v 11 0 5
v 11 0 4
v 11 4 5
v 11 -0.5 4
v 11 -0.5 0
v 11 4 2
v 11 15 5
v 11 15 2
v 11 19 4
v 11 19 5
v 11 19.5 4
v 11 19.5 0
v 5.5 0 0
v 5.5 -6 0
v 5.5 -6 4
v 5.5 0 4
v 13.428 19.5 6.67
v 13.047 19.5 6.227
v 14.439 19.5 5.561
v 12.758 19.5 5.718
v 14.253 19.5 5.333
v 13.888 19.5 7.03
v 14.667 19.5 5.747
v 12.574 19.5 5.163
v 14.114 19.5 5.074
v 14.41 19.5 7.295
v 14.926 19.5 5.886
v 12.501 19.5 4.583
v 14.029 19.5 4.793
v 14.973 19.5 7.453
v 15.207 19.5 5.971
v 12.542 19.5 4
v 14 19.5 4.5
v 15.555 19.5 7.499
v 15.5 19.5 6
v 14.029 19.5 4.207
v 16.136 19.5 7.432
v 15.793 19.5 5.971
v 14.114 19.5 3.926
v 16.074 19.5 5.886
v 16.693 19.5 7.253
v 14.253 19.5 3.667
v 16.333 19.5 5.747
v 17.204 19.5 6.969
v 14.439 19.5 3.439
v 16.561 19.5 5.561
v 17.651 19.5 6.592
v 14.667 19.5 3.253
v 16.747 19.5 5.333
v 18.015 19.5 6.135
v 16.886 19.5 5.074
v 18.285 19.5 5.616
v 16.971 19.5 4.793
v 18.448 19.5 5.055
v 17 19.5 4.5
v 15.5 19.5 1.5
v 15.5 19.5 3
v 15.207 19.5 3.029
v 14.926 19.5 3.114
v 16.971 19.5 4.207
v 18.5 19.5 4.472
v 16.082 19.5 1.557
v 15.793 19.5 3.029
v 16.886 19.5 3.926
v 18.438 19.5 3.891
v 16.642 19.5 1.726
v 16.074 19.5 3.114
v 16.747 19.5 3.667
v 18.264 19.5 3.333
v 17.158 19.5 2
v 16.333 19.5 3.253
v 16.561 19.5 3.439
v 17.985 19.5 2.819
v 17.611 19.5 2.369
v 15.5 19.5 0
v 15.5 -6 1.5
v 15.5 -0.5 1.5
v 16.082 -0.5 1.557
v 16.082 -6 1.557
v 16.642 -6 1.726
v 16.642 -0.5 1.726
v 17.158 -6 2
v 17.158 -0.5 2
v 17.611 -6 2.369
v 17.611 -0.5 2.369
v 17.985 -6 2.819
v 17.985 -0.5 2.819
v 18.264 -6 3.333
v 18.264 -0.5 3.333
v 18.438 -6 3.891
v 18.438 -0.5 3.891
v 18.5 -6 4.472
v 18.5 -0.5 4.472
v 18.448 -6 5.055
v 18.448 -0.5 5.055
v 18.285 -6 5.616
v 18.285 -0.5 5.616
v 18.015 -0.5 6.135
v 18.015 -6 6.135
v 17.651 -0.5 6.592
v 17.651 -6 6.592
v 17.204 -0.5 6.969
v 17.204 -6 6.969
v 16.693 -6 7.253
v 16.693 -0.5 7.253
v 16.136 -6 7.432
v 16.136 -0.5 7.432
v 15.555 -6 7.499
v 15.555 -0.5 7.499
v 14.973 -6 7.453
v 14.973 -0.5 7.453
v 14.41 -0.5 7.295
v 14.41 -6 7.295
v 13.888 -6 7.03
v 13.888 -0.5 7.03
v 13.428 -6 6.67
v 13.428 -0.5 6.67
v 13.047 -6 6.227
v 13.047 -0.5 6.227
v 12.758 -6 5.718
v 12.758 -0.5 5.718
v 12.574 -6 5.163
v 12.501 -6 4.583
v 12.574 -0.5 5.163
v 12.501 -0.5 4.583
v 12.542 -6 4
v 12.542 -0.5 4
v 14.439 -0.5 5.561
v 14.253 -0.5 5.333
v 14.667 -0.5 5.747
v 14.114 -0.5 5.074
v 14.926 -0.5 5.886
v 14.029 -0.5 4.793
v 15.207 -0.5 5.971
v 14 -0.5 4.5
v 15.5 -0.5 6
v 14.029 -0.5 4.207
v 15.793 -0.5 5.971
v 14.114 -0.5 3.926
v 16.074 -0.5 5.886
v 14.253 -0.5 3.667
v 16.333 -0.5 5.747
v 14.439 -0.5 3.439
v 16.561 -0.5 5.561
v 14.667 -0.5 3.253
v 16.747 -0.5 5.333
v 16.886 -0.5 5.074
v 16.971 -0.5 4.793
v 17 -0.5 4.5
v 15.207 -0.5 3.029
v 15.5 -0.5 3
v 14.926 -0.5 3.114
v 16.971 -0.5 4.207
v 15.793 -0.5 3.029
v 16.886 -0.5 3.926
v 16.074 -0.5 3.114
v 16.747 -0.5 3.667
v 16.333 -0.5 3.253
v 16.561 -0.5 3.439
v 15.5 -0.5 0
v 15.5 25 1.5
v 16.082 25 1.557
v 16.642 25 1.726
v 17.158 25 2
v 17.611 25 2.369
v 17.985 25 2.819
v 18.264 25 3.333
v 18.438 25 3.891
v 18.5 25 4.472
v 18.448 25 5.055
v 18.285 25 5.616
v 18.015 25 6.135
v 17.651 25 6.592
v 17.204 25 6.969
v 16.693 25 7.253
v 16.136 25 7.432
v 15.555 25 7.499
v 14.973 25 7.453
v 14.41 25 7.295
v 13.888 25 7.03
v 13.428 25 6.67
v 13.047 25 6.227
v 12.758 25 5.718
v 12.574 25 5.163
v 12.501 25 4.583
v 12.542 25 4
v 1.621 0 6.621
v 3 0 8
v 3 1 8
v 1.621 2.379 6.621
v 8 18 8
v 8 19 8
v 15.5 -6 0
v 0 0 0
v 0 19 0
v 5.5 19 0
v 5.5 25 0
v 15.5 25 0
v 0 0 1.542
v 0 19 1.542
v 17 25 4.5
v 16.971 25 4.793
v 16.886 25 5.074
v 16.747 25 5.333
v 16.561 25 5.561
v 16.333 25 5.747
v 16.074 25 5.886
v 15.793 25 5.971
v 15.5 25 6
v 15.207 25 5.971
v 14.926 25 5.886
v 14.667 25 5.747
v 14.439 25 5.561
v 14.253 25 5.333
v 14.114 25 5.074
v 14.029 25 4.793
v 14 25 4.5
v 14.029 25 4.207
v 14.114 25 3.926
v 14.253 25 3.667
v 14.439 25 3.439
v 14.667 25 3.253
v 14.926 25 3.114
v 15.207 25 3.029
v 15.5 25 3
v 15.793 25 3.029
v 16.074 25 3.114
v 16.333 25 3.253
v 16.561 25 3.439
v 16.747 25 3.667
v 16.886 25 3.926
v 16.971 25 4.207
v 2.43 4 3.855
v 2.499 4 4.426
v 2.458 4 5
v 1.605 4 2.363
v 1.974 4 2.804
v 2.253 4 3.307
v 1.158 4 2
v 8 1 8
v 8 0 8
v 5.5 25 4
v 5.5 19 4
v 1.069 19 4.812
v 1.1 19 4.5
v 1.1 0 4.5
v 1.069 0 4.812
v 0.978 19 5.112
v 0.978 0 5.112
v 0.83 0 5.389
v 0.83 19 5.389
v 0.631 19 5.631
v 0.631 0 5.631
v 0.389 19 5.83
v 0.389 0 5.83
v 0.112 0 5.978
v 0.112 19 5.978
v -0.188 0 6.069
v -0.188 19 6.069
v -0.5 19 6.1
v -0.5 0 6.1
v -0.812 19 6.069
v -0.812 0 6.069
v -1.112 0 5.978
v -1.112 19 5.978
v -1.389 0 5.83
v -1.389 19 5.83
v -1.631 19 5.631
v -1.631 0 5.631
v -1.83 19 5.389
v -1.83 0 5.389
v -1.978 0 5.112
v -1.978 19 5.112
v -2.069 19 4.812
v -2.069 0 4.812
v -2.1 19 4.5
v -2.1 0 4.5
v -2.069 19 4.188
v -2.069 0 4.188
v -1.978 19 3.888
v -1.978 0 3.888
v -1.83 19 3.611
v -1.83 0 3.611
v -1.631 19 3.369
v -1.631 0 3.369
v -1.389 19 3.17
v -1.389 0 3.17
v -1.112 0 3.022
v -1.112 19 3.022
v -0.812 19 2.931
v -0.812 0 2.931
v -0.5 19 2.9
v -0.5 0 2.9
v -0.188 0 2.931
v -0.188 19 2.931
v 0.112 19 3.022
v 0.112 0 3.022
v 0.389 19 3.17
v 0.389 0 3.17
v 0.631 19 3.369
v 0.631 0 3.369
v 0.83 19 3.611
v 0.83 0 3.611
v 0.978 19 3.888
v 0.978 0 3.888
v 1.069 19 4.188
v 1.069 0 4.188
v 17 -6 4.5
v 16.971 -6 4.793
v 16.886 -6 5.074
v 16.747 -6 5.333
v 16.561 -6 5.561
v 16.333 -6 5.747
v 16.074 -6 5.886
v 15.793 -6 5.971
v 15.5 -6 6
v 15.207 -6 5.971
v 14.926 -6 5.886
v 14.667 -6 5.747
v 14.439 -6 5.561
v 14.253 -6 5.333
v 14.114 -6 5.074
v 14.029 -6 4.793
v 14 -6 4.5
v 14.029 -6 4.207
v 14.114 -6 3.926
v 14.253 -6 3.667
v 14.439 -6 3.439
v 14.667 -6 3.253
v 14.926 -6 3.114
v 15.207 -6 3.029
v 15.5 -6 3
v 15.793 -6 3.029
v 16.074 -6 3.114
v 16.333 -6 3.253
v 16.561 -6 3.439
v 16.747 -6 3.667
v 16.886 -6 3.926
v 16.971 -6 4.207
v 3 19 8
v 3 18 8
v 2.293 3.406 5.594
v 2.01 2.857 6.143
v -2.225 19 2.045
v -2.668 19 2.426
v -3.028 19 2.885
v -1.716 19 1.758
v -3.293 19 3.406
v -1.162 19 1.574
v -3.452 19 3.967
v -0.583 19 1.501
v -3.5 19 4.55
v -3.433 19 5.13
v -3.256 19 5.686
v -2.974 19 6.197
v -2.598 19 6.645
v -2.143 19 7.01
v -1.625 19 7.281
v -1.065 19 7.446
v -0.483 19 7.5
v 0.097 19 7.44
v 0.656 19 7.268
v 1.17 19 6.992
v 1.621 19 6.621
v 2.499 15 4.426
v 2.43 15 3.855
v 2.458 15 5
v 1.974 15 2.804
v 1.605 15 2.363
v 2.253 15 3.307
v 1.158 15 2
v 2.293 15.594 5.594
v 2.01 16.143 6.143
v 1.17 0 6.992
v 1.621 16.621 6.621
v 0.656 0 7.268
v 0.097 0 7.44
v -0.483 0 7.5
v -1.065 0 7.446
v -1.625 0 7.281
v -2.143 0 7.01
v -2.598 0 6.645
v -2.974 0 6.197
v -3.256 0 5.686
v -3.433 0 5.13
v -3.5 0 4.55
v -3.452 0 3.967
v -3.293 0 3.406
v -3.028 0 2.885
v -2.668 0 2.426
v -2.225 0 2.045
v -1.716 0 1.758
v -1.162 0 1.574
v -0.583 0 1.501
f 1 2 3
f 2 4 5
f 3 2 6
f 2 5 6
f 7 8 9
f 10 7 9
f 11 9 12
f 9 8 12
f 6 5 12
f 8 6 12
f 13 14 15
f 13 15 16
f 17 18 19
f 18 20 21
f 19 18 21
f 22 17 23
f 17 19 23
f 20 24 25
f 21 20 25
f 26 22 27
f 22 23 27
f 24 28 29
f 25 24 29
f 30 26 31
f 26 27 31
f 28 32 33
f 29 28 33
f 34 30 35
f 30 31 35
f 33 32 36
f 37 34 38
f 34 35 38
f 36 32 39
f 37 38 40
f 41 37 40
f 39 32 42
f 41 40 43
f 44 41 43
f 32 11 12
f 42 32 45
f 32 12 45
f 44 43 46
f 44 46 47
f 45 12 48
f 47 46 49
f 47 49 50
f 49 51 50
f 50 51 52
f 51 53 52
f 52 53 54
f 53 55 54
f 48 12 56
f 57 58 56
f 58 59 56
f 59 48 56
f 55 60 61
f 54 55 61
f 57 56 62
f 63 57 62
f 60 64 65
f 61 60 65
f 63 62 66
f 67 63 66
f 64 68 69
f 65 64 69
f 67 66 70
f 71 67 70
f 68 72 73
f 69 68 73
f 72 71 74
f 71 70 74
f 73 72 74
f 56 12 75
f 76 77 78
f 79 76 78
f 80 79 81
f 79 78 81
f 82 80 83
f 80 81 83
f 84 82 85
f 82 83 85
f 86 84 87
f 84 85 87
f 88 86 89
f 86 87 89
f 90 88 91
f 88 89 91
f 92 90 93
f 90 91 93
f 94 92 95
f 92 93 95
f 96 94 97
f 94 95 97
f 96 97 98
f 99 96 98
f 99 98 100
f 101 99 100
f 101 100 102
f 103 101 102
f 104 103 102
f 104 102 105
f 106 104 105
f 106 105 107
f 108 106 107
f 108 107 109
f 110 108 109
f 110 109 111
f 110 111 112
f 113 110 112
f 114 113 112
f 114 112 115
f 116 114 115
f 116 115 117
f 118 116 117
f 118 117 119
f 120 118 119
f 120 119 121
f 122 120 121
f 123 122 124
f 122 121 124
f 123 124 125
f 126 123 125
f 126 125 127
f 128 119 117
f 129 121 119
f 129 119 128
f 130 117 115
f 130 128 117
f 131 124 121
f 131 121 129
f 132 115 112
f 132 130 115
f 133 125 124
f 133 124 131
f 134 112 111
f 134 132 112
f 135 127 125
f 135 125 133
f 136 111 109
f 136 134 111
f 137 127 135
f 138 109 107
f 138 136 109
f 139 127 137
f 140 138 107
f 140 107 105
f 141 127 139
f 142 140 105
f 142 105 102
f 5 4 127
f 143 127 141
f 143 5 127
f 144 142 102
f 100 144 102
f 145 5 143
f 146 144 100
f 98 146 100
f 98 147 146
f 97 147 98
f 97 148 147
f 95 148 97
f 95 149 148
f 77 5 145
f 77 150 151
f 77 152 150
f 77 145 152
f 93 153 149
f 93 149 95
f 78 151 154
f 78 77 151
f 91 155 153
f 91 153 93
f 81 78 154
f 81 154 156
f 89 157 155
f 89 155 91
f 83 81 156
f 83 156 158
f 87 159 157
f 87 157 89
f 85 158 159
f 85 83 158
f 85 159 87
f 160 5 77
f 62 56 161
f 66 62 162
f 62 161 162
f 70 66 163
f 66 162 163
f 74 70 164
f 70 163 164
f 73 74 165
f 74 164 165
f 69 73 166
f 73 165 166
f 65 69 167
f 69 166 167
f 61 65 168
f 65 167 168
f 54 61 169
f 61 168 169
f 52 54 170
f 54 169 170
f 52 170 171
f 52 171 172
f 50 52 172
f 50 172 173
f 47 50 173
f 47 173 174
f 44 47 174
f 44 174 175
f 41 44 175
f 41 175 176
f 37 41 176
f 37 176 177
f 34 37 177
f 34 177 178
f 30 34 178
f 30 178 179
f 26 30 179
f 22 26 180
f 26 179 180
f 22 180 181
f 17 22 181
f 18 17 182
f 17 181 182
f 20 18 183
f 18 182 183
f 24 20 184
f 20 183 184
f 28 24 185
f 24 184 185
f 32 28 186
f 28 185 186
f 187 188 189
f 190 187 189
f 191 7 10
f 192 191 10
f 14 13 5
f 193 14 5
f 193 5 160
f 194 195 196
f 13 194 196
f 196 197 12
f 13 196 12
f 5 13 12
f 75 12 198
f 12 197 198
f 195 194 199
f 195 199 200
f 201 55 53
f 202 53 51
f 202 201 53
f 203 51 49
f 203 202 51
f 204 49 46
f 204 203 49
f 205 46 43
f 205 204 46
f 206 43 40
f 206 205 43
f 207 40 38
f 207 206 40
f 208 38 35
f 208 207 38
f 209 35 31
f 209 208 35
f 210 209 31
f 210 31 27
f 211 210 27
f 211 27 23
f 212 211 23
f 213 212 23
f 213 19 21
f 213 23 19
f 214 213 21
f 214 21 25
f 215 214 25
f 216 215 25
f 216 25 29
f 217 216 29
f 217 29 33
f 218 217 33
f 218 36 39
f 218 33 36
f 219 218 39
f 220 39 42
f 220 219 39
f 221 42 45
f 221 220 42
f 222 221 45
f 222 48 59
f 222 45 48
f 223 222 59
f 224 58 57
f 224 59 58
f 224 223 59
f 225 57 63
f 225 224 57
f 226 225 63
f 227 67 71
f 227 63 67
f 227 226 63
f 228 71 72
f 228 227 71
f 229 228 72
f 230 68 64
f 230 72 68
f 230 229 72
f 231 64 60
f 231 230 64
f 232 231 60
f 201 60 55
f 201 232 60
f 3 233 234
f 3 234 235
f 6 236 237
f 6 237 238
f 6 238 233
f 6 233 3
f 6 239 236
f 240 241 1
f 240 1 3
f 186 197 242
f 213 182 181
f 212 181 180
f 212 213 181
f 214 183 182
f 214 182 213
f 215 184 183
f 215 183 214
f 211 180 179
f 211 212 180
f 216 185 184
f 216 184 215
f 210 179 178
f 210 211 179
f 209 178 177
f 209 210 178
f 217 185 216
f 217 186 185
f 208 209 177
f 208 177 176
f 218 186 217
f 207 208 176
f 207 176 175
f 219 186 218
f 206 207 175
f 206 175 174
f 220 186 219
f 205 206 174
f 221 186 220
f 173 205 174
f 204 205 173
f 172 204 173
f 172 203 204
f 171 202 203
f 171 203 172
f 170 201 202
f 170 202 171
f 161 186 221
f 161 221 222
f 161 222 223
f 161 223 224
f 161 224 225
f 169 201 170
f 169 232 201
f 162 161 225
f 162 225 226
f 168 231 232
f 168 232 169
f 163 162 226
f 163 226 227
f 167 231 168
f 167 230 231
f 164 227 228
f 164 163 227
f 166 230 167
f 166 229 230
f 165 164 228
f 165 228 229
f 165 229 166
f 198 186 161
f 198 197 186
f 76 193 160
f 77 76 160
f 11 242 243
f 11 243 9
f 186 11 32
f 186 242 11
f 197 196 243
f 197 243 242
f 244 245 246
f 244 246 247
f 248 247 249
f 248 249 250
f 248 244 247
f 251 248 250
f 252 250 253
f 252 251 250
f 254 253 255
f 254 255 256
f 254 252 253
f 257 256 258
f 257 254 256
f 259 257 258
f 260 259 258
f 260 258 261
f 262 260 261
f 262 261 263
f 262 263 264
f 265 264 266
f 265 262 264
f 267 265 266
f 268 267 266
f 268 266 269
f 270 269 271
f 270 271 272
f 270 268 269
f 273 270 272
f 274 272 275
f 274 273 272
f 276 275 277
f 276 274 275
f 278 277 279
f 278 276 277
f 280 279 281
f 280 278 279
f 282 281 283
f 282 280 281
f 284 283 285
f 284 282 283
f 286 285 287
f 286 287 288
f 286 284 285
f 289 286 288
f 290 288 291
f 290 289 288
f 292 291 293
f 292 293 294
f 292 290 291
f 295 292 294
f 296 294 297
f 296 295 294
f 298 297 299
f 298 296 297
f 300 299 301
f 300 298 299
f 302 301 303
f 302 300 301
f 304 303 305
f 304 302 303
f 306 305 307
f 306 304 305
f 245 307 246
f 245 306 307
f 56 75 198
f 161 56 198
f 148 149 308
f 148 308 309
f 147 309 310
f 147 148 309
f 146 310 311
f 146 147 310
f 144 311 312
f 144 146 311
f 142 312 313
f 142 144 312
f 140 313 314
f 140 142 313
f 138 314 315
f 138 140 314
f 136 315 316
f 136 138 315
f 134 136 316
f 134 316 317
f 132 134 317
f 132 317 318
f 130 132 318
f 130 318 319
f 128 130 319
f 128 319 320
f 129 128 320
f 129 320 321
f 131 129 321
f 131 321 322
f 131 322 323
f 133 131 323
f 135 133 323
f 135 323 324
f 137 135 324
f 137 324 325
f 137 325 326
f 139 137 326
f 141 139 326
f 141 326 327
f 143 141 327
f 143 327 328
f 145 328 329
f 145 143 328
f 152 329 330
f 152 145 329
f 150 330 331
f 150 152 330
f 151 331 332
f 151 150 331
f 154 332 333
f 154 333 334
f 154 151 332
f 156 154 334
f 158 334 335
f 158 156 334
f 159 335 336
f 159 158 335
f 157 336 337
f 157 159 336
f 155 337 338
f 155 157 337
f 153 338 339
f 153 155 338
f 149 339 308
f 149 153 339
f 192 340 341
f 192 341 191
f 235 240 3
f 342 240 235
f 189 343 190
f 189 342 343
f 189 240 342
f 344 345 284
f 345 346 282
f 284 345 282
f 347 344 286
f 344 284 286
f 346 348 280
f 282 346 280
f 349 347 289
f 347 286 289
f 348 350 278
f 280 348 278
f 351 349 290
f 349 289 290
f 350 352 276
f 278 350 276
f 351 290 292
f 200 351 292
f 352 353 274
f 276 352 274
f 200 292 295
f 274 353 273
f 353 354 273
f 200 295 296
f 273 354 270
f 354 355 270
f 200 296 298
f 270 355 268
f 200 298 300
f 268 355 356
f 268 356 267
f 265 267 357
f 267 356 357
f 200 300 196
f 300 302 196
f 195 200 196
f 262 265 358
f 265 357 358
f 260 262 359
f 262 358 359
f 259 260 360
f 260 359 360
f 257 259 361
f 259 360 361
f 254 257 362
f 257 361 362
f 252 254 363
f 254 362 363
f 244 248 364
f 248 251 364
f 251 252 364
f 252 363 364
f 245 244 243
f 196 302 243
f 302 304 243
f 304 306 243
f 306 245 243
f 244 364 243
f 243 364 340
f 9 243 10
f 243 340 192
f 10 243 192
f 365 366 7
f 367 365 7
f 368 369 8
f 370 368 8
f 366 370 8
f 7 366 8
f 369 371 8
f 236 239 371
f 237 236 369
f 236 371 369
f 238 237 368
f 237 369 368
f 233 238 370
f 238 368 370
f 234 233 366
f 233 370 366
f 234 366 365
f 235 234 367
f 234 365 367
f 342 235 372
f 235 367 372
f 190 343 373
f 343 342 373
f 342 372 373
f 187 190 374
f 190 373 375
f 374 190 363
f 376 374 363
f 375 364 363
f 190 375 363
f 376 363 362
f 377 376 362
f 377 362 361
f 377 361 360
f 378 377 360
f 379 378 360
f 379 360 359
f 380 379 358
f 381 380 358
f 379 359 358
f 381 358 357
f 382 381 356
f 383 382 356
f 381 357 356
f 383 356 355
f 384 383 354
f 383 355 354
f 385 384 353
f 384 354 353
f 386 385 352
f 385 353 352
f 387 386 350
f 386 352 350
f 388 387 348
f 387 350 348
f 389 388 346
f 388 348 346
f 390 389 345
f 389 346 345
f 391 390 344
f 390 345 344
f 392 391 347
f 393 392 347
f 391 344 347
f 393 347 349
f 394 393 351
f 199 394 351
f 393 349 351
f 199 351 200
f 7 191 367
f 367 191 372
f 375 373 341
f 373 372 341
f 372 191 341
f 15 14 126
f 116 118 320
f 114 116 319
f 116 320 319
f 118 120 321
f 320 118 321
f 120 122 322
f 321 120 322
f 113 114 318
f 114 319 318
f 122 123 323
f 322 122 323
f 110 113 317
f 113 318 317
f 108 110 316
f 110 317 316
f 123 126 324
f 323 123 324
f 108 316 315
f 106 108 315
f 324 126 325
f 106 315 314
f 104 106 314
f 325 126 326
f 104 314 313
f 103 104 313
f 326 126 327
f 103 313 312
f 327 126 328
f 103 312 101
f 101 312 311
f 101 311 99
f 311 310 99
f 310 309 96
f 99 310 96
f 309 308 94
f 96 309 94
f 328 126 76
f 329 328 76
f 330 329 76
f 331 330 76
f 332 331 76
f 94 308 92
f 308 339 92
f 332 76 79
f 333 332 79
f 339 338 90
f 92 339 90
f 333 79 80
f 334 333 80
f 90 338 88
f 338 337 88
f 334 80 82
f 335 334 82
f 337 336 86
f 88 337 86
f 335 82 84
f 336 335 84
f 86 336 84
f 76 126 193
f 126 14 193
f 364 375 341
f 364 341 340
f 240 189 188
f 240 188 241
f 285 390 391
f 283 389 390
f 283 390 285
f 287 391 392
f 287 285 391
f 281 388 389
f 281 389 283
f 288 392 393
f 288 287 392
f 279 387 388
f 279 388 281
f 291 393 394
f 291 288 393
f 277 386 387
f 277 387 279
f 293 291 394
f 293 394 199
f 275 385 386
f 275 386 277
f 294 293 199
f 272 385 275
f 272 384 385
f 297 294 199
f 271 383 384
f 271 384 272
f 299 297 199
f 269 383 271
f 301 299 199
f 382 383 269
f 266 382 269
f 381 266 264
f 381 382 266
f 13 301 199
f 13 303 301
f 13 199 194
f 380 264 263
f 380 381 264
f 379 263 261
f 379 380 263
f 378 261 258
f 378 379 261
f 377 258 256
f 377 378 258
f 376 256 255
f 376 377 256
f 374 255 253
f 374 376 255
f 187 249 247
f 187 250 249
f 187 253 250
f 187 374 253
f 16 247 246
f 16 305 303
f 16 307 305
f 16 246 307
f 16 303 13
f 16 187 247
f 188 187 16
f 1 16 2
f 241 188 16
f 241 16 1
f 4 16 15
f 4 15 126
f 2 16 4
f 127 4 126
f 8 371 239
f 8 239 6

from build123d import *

# Parameters (mm, degrees)
BOX005_W               = 11
BOX005_H               = 20
BOX005_DEPTH           = 8
CYLINDER002_R          = 1.6
CYLINDER002_DEPTH      = 19
CYLINDER002_ROLL_ANGLE = 90
BOX001_W               = 15
BOX001_H               = 11
BOX001_DEPTH           = 7
BOX_W                  = 11
BOX_H                  = 19
BOX_DEPTH              = 8
CHAMFER_SIZE           = 3
CHAMFER001_SIZE        = 3
CHAMFER003_SIZE        = 3
CHAMFER004_SIZE        = 3
CYLINDER005_R          = 3
CYLINDER005_DEPTH      = 19
CYLINDER005_ROLL_ANGLE = 90
CYLINDER007_R          = 1.5
CYLINDER007_DEPTH      = 6
CYLINDER007_ROLL_ANGLE = 90
BOX004_W               = 10
BOX004_H               = 6
BOX004_DEPTH           = 4
CYLINDER008_R          = 3
CYLINDER008_DEPTH      = 6
CYLINDER008_ROLL_ANGLE = 90
CYLINDER003_R          = 1.5
CYLINDER003_DEPTH      = 6
CYLINDER003_ROLL_ANGLE = 90
BOX002_W               = 10
BOX002_H               = 6
BOX002_DEPTH           = 4
CYLINDER004_R          = 3
CYLINDER004_DEPTH      = 6
CYLINDER004_ROLL_ANGLE = 90


with BuildPart() as cube005:
    # Box005 → Box005 (new body)
    with BuildSketch(Plane(origin=(11, -0.5, 0), x_dir=(1, 0, 0), z_dir=(0, 0, 1))):
        with Locations((5.5, 10)):
            Rectangle(BOX005_W, BOX005_H)
    extrude(amount=BOX005_DEPTH)


with BuildPart() as cylinder001:
    # Cylinder002 → Cylinder002 (new body)
    with BuildSketch(Plane.XY):
        Circle(CYLINDER002_R)
    extrude(amount=CYLINDER002_DEPTH)


with BuildPart() as cylinder001_1:
    # Cylinder002 roll: moved
    add(cylinder001.part.rotate(Axis((0, 0, 0), (1, 0, 0)), CYLINDER002_ROLL_ANGLE))


with BuildPart() as cylinder001_2:
    # Cylinder002 placement: moved
    add(cylinder001_1.part.moved(Location((-0.5, 19, 4.5))))


with BuildPart() as cube001:
    # Box001 → Box001 (new body)
    with BuildSketch(Plane(origin=(0, 4, 2), x_dir=(1, 0, 0), z_dir=(0, 0, 1))):
        with Locations((7.5, 5.5)):
            Rectangle(BOX001_W, BOX001_H)
    extrude(amount=BOX001_DEPTH)


with BuildPart() as chamfer004:
    # Box → Box (new body)
    with BuildSketch(Plane.XY):
        with Locations((5.5, 9.5)):
            Rectangle(BOX_W, BOX_H)
    extrude(amount=BOX_DEPTH)

    # Chamfer
    chamfer_edges = [chamfer004.edges().sort_by_distance(p)[0] for p in [
        (11, 9.5, 8),
    ]]
    chamfer(chamfer_edges, length=CHAMFER_SIZE)

    # Chamfer001
    chamfer001_edges = [chamfer004.edges().sort_by_distance(p)[0] for p in [
        (0, 9.5, 8),
    ]]
    chamfer(chamfer001_edges, length=CHAMFER001_SIZE)

    # Cut003: cut Cube001
    add(cube001.part, mode=Mode.SUBTRACT)

    # Chamfer003
    chamfer003_edges = [chamfer004.edges().sort_by_distance(p)[0] for p in [
        (5.5, 15, 8),
    ]]
    chamfer(chamfer003_edges, length=CHAMFER003_SIZE)

    # Chamfer004
    chamfer004_edges = [chamfer004.edges().sort_by_distance(p)[0] for p in [
        (5.5, 4, 8),
    ]]
    chamfer(chamfer004_edges, length=CHAMFER004_SIZE)


with BuildPart() as central_eslabon:
    # Cylinder005 → Cylinder005 (new body)
    with BuildSketch(Plane.XY):
        Circle(CYLINDER005_R)
    extrude(amount=CYLINDER005_DEPTH)


with BuildPart() as central_eslabon_1:
    # Cylinder005 roll: moved
    add(central_eslabon.part.rotate(Axis((0, 0, 0), (1, 0, 0)), CYLINDER005_ROLL_ANGLE))


with BuildPart() as central_eslabon_2:
    # Cylinder005 placement: moved
    add(central_eslabon_1.part.moved(Location((-0.5, 19, 4.5))))

    # Fusion001: union Chamfer004
    add(chamfer004.part)

    # Cut004: cut Cylinder001
    add(cylinder001_2.part, mode=Mode.SUBTRACT)


with BuildPart() as cylinder029:
    # Cylinder007 → Cylinder007 (new body)
    with BuildSketch(Plane.XY):
        Circle(CYLINDER007_R)
    extrude(amount=CYLINDER007_DEPTH)


with BuildPart() as cylinder029_1:
    # Cylinder007 roll: moved
    add(cylinder029.part.rotate(Axis((0, 0, 0), (1, 0, 0)), CYLINDER007_ROLL_ANGLE))


with BuildPart() as cylinder029_2:
    # Cylinder007 placement: moved
    add(cylinder029_1.part.moved(Location((15.5, 25, 4.5))))


with BuildPart() as cube004:
    # Box004 → Box004 (new body)
    with BuildSketch(Plane(origin=(5, 19, 0), x_dir=(1, 0, 0), z_dir=(0, 0, 1))):
        with Locations((5, 3)):
            Rectangle(BOX004_W, BOX004_H)
    extrude(amount=BOX004_DEPTH)


with BuildPart() as lado_1_eslabon001:
    # Cylinder008 → Cylinder008 (new body)
    with BuildSketch(Plane.XY):
        Circle(CYLINDER008_R)
    extrude(amount=CYLINDER008_DEPTH)


with BuildPart() as lado_1_eslabon001_1:
    # Cylinder008 roll: moved
    add(lado_1_eslabon001.part.rotate(Axis((0, 0, 0), (1, 0, 0)), CYLINDER008_ROLL_ANGLE))


with BuildPart() as lado_1_eslabon001_2:
    # Cylinder008 placement: moved
    add(lado_1_eslabon001_1.part.moved(Location((15, 25, 4.5))))

    # Fusion002: union Cube004
    add(cube004.part)


with BuildPart() as lado_1_eslabon001_3:
    # Fusion002 placement: moved
    add(lado_1_eslabon001_2.part.moved(Location((0.5, 0, 0))))

    # Cut005: cut Cylinder029
    add(cylinder029_2.part, mode=Mode.SUBTRACT)


with BuildPart() as cylinder002:
    # Cylinder003 → Cylinder003 (new body)
    with BuildSketch(Plane.XY):
        Circle(CYLINDER003_R)
    extrude(amount=CYLINDER003_DEPTH)


with BuildPart() as cylinder002_1:
    # Cylinder003 roll: moved
    add(cylinder002.part.rotate(Axis((0, 0, 0), (1, 0, 0)), CYLINDER003_ROLL_ANGLE))


with BuildPart() as cylinder002_2:
    # Cylinder003 placement: moved
    add(cylinder002_1.part.moved(Location((15.5, 0, 4.5))))


with BuildPart() as cube002:
    # Box002 → Box002 (new body)
    with BuildSketch(Plane(origin=(5, -6, 0), x_dir=(1, 0, 0), z_dir=(0, 0, 1))):
        with Locations((5, 3)):
            Rectangle(BOX002_W, BOX002_H)
    extrude(amount=BOX002_DEPTH)


with BuildPart() as eslabon:
    # Cylinder004 → Cylinder004 (new body)
    with BuildSketch(Plane.XY):
        Circle(CYLINDER004_R)
    extrude(amount=CYLINDER004_DEPTH)


with BuildPart() as eslabon_1:
    # Cylinder004 roll: moved
    add(eslabon.part.rotate(Axis((0, 0, 0), (1, 0, 0)), CYLINDER004_ROLL_ANGLE))


with BuildPart() as eslabon_2:
    # Cylinder004 placement: moved
    add(eslabon_1.part.moved(Location((15, 0, 4.5))))

    # Fusion: union Cube002
    add(cube002.part)


with BuildPart() as eslabon_3:
    # Fusion placement: moved
    add(eslabon_2.part.moved(Location((0.5, 0, 0))))

    # Cut002: cut Cylinder002
    add(cylinder002_2.part, mode=Mode.SUBTRACT)

    # Fusion003: union Central Eslabon, Lado 1 Eslabon001
    add(central_eslabon_2.part)
    add(lado_1_eslabon001_3.part)

    # Cut006: cut Cube005
    add(cube005.part, mode=Mode.SUBTRACT)


solid = eslabon_3.part
